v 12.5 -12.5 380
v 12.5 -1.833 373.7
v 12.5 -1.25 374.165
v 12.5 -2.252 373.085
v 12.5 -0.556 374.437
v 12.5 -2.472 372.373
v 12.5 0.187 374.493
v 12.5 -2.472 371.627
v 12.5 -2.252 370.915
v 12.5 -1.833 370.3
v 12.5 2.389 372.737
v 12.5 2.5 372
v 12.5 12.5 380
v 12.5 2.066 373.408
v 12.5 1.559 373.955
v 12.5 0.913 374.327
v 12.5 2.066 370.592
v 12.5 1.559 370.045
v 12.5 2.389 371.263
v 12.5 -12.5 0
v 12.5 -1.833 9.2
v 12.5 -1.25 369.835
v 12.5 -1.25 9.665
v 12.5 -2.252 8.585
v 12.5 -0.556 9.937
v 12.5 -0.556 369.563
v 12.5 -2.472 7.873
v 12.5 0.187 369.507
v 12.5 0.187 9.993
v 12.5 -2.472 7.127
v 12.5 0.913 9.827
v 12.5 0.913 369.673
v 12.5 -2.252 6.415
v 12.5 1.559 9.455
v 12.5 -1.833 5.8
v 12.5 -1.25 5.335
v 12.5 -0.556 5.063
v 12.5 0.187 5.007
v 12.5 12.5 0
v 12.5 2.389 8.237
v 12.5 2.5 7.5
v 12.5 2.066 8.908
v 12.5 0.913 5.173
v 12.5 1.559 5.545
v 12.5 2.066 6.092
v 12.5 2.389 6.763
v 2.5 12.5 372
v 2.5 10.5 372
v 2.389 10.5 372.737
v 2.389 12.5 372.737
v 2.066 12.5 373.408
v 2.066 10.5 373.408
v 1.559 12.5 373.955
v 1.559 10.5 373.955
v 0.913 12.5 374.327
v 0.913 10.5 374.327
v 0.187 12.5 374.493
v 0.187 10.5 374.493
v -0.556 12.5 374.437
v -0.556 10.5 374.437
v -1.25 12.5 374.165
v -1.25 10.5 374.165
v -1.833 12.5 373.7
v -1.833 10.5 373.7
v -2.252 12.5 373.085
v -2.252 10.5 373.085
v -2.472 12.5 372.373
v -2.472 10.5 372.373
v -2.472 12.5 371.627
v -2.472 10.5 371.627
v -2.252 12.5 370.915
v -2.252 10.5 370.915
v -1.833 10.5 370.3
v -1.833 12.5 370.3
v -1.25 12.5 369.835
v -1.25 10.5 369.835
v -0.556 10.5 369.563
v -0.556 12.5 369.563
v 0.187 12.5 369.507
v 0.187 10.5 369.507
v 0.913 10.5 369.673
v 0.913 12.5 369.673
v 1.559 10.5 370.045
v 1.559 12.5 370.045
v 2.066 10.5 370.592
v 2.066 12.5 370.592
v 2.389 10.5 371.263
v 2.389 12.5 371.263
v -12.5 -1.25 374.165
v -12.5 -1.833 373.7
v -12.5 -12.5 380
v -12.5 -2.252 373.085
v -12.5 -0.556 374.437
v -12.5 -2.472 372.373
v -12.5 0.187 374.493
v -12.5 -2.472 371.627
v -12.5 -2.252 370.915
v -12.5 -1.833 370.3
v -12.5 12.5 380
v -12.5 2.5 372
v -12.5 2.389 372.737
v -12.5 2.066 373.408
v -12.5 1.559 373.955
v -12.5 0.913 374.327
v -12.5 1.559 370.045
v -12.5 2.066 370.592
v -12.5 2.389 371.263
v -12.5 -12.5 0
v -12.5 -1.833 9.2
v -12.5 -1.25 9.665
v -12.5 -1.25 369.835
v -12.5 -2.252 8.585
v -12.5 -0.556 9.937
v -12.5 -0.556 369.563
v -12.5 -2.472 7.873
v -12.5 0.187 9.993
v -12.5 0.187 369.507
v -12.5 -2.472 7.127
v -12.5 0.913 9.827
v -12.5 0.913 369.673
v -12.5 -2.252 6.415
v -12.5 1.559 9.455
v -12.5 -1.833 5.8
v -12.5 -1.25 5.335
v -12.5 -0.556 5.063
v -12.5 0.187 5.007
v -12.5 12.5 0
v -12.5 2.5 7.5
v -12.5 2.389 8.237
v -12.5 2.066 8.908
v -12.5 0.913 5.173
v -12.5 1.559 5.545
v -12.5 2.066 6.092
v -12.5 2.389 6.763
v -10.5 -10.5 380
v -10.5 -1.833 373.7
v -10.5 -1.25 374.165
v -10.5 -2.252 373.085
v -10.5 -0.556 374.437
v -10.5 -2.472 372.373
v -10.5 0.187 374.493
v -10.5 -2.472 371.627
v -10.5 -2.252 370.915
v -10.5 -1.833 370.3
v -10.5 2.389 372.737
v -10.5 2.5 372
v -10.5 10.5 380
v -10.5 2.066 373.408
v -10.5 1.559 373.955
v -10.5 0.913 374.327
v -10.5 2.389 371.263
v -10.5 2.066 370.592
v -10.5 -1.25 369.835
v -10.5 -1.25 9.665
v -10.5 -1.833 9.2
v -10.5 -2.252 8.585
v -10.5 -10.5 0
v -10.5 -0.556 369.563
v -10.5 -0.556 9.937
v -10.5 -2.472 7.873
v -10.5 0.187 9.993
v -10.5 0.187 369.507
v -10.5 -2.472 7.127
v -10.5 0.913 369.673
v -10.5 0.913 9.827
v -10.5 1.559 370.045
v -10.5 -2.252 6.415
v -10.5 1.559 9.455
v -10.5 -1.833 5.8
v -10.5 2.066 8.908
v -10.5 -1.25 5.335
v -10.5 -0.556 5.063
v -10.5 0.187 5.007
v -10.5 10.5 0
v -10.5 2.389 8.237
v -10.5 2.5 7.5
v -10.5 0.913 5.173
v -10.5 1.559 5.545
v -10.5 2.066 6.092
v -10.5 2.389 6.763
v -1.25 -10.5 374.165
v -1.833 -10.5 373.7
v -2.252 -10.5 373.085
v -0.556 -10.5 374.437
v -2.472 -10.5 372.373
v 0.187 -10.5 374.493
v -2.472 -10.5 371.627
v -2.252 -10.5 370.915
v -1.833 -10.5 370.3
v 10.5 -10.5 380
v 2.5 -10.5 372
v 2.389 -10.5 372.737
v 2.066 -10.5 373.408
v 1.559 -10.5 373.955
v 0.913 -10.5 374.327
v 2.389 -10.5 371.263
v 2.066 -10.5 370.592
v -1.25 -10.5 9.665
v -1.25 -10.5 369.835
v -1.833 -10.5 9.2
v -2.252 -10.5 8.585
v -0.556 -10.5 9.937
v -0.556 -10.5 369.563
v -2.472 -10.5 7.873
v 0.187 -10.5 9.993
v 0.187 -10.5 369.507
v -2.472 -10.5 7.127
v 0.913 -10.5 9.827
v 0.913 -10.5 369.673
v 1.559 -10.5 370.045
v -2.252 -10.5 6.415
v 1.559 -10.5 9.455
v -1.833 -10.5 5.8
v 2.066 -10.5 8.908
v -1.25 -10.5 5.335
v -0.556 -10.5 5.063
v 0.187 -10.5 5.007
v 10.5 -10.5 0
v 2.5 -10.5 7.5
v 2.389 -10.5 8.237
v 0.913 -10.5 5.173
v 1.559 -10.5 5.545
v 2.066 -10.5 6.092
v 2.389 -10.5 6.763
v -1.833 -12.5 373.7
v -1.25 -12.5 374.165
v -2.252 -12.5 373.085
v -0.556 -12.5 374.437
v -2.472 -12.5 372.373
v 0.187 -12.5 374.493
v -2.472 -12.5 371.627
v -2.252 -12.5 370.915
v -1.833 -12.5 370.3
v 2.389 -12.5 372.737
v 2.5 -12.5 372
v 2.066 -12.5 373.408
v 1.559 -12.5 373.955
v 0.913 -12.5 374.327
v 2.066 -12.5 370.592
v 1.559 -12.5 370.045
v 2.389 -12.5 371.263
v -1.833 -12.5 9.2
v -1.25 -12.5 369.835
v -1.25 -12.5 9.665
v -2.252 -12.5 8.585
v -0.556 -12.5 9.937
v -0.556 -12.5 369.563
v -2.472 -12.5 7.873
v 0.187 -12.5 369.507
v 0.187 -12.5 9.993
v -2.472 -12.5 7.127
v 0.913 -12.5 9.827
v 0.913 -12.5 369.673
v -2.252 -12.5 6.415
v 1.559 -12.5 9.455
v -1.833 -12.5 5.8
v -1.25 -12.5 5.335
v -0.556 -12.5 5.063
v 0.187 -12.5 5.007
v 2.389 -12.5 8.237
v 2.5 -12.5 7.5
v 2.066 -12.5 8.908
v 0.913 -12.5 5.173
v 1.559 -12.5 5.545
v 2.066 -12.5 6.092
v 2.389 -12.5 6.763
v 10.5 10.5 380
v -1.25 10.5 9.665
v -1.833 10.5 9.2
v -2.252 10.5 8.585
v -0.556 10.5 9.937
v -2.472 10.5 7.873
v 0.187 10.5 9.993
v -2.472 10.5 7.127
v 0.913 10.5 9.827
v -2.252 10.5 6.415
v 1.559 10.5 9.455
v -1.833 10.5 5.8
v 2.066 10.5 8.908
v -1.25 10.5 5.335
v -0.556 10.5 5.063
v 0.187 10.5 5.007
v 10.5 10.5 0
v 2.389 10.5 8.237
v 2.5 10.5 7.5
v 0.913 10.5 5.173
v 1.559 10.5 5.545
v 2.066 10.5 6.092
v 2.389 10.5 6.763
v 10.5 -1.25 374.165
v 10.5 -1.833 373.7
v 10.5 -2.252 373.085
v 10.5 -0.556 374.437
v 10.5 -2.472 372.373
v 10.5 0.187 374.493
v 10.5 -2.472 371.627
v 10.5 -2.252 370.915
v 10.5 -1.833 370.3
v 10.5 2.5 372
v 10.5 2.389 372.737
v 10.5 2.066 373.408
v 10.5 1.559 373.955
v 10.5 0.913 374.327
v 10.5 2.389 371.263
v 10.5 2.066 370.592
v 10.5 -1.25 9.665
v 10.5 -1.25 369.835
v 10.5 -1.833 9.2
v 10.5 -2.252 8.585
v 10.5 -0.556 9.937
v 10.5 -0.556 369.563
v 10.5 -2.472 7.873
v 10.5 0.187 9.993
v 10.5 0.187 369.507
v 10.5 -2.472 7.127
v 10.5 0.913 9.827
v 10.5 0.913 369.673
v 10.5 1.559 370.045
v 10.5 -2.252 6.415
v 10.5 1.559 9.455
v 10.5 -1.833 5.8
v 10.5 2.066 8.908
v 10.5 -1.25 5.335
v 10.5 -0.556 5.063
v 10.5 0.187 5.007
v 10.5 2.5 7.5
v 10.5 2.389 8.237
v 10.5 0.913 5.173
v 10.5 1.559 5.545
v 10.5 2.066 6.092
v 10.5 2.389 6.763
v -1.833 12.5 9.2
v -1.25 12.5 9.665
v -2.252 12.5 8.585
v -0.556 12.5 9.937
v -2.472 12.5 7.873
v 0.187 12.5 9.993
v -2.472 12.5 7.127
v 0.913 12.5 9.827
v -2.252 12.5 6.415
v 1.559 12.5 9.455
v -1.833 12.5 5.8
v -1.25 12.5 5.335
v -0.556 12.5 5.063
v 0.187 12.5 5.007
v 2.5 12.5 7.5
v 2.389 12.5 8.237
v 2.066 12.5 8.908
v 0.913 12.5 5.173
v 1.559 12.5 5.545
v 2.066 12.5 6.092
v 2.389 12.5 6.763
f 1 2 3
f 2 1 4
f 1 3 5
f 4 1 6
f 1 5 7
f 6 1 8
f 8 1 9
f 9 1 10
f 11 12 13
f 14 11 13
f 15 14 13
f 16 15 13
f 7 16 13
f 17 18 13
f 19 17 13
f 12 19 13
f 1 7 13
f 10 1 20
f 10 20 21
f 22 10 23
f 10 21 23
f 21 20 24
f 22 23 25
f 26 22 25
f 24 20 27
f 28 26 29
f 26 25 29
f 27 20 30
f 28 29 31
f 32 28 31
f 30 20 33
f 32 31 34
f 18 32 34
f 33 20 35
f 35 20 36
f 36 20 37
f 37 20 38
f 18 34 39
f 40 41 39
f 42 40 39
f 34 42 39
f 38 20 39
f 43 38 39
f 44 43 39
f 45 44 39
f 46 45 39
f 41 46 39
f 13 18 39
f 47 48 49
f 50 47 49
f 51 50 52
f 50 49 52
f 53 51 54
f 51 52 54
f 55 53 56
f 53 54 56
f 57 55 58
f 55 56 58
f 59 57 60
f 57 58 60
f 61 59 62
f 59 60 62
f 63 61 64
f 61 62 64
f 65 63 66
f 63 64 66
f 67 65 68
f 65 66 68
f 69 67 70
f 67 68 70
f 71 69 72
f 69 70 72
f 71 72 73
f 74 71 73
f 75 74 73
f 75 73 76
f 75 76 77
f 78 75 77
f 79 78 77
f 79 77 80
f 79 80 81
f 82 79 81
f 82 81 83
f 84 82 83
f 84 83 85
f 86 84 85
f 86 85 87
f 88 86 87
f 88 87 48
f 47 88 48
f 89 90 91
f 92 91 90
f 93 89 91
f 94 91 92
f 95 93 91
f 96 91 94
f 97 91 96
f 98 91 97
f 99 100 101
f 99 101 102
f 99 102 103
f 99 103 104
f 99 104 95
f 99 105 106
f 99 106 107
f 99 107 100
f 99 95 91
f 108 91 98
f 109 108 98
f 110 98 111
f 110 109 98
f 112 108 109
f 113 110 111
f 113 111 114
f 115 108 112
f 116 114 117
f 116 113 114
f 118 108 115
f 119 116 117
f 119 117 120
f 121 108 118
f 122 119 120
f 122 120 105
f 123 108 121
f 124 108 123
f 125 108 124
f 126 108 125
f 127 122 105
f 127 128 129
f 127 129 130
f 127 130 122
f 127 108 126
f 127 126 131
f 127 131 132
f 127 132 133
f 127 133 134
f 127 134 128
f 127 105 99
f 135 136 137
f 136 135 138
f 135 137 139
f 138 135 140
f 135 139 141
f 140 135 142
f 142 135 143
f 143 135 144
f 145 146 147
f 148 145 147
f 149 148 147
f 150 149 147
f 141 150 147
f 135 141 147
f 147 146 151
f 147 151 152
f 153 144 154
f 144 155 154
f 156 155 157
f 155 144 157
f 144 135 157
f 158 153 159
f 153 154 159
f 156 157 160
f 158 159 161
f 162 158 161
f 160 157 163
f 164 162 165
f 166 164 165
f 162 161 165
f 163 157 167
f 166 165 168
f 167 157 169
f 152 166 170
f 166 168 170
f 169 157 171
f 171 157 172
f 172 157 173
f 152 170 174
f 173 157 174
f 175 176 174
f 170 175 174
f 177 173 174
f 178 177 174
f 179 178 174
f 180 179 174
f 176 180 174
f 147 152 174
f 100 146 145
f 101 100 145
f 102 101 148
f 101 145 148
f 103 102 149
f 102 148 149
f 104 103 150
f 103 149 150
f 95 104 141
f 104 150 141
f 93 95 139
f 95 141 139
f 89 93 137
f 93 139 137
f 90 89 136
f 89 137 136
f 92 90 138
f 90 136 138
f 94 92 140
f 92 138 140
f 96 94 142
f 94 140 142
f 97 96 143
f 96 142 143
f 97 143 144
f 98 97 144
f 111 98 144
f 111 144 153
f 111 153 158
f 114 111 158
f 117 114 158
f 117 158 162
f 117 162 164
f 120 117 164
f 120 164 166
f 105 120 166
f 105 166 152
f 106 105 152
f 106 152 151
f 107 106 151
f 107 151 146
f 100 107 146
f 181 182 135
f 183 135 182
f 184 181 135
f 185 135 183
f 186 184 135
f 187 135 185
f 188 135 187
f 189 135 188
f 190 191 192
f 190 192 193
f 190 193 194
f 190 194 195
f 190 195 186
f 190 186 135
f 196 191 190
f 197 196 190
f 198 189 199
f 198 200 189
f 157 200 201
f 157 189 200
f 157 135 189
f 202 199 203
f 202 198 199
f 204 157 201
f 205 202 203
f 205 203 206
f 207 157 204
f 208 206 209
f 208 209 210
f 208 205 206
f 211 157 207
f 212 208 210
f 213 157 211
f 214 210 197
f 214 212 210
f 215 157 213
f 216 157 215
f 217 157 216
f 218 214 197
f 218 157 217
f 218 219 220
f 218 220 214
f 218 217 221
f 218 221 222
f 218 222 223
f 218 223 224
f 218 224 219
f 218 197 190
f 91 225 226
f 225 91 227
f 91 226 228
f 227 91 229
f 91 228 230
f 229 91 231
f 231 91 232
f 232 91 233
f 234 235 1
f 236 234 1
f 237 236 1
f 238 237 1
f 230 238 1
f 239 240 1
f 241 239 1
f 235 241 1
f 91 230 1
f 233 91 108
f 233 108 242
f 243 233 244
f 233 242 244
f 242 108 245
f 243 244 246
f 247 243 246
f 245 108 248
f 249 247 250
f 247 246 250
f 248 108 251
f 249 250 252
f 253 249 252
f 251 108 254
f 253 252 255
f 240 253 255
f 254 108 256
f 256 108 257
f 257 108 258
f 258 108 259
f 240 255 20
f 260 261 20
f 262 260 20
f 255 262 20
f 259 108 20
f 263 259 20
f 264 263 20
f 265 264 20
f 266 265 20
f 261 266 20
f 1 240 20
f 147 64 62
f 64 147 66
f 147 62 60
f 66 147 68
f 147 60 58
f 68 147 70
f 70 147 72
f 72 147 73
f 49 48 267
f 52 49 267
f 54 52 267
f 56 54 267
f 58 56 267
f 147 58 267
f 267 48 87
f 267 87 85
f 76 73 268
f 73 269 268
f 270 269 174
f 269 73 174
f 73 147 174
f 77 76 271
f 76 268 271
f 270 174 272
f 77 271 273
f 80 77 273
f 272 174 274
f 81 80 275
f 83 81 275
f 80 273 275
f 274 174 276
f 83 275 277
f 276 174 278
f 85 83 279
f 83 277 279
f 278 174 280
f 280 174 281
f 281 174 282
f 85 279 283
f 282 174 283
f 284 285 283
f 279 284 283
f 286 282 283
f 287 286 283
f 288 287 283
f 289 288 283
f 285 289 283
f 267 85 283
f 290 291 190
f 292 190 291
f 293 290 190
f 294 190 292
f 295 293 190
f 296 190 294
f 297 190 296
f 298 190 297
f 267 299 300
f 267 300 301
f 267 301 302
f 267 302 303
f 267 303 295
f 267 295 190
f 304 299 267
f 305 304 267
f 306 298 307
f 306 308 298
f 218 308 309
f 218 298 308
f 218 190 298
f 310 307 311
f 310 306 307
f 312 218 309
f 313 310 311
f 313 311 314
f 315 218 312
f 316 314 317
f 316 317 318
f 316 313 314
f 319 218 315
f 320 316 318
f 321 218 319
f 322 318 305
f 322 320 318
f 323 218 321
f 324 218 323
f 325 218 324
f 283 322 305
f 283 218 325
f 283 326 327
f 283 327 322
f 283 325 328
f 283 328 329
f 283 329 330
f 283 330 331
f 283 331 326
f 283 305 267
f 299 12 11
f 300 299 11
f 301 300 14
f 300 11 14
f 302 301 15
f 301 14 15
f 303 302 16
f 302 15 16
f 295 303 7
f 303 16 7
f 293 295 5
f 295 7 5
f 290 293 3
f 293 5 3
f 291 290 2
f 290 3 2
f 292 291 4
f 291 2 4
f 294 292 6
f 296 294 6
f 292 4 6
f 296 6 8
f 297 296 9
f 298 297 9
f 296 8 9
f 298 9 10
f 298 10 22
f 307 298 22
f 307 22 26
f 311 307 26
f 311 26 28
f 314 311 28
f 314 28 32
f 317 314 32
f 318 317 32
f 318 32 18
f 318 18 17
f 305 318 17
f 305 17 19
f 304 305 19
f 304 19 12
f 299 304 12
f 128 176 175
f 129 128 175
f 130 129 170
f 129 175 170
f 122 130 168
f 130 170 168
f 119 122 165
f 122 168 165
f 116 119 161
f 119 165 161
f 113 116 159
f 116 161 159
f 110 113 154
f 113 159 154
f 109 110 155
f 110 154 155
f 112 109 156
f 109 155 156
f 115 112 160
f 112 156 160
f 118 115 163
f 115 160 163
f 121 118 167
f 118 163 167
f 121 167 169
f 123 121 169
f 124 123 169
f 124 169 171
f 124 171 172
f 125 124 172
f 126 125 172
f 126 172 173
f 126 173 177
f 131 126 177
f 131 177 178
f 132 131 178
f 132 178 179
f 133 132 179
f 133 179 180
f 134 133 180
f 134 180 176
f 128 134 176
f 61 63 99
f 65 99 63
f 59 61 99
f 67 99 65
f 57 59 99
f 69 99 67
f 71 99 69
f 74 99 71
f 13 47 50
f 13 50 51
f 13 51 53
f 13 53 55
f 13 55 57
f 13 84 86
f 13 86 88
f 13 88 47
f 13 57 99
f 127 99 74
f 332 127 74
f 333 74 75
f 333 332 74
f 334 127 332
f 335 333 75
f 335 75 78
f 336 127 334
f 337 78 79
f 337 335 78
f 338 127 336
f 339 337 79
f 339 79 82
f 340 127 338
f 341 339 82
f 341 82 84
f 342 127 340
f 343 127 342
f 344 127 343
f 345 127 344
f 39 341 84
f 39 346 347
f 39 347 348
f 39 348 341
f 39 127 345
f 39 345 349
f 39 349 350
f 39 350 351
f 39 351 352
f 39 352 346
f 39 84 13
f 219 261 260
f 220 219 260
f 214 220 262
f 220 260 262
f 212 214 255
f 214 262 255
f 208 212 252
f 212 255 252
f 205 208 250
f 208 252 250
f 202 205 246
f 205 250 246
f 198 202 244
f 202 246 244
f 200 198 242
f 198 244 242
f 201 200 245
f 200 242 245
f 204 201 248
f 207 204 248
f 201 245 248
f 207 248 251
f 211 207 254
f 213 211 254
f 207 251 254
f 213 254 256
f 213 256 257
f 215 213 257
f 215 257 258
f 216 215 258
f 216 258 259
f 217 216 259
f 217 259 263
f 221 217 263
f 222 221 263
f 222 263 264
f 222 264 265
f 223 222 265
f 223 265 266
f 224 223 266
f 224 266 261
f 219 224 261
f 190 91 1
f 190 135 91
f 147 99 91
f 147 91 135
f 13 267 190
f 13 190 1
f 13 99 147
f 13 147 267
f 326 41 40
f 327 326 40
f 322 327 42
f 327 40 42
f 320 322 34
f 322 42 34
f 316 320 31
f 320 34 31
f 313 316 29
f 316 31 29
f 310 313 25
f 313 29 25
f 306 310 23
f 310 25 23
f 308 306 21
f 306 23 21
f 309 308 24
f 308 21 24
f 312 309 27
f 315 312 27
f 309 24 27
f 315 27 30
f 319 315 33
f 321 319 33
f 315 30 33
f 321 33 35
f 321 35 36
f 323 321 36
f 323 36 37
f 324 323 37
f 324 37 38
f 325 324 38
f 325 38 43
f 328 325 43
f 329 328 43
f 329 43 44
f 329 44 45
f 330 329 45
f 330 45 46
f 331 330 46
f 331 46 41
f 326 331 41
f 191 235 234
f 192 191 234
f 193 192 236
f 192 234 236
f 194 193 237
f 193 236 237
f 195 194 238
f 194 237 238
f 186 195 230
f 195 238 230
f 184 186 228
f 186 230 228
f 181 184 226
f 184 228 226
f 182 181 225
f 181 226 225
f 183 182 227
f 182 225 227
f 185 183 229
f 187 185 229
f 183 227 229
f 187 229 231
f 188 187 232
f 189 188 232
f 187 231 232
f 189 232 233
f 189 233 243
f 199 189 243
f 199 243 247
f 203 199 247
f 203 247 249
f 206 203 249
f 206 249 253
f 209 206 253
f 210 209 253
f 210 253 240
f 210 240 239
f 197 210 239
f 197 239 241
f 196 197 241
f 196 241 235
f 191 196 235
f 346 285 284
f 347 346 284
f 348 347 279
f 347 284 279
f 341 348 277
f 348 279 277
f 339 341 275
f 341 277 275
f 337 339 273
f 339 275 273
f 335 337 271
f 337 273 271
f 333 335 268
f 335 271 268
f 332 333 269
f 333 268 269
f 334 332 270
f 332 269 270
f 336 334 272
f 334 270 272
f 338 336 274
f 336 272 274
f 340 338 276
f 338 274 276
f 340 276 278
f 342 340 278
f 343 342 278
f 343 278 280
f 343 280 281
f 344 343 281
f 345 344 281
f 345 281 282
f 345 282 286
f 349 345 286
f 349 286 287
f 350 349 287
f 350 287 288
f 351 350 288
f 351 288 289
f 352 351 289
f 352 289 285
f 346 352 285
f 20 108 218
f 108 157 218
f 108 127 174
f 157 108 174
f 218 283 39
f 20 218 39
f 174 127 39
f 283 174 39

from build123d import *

# Parameters (mm, degrees)
F0_W     = 25
F0_H     = 25
F0_W_2   = 21
F0_H_2   = 21
F1_DEPTH = 380
F2_R     = 2.5
F3_DEPTH = 25
F4_R     = 2.5
F5_DEPTH = 25


with BuildPart() as f1:
    # F0 (on Top) → F1 (new body)
    with BuildSketch(Plane.XY):
        Rectangle(F0_W, F0_H)
        Rectangle(F0_W_2, F0_H_2, mode=Mode.SUBTRACT)
    extrude(amount=F1_DEPTH)

    # F2 (on face) → F3 (cut)
    with BuildSketch(Plane.XZ.offset(12.5)):
        with Locations((0, 372)):
            Circle(F2_R)
        with Locations((0, 7.5)):
            Circle(F2_R)
    extrude(amount=-F3_DEPTH, mode=Mode.SUBTRACT)

    # F4 (on face) → F5 (cut)
    with BuildSketch(Plane.YZ.offset(12.5)):
        with Locations((0, 372)):
            Circle(F4_R)
        with Locations((0, 7.5)):
            Circle(F4_R)
    extrude(amount=-F5_DEPTH, mode=Mode.SUBTRACT)


solid = f1.part
